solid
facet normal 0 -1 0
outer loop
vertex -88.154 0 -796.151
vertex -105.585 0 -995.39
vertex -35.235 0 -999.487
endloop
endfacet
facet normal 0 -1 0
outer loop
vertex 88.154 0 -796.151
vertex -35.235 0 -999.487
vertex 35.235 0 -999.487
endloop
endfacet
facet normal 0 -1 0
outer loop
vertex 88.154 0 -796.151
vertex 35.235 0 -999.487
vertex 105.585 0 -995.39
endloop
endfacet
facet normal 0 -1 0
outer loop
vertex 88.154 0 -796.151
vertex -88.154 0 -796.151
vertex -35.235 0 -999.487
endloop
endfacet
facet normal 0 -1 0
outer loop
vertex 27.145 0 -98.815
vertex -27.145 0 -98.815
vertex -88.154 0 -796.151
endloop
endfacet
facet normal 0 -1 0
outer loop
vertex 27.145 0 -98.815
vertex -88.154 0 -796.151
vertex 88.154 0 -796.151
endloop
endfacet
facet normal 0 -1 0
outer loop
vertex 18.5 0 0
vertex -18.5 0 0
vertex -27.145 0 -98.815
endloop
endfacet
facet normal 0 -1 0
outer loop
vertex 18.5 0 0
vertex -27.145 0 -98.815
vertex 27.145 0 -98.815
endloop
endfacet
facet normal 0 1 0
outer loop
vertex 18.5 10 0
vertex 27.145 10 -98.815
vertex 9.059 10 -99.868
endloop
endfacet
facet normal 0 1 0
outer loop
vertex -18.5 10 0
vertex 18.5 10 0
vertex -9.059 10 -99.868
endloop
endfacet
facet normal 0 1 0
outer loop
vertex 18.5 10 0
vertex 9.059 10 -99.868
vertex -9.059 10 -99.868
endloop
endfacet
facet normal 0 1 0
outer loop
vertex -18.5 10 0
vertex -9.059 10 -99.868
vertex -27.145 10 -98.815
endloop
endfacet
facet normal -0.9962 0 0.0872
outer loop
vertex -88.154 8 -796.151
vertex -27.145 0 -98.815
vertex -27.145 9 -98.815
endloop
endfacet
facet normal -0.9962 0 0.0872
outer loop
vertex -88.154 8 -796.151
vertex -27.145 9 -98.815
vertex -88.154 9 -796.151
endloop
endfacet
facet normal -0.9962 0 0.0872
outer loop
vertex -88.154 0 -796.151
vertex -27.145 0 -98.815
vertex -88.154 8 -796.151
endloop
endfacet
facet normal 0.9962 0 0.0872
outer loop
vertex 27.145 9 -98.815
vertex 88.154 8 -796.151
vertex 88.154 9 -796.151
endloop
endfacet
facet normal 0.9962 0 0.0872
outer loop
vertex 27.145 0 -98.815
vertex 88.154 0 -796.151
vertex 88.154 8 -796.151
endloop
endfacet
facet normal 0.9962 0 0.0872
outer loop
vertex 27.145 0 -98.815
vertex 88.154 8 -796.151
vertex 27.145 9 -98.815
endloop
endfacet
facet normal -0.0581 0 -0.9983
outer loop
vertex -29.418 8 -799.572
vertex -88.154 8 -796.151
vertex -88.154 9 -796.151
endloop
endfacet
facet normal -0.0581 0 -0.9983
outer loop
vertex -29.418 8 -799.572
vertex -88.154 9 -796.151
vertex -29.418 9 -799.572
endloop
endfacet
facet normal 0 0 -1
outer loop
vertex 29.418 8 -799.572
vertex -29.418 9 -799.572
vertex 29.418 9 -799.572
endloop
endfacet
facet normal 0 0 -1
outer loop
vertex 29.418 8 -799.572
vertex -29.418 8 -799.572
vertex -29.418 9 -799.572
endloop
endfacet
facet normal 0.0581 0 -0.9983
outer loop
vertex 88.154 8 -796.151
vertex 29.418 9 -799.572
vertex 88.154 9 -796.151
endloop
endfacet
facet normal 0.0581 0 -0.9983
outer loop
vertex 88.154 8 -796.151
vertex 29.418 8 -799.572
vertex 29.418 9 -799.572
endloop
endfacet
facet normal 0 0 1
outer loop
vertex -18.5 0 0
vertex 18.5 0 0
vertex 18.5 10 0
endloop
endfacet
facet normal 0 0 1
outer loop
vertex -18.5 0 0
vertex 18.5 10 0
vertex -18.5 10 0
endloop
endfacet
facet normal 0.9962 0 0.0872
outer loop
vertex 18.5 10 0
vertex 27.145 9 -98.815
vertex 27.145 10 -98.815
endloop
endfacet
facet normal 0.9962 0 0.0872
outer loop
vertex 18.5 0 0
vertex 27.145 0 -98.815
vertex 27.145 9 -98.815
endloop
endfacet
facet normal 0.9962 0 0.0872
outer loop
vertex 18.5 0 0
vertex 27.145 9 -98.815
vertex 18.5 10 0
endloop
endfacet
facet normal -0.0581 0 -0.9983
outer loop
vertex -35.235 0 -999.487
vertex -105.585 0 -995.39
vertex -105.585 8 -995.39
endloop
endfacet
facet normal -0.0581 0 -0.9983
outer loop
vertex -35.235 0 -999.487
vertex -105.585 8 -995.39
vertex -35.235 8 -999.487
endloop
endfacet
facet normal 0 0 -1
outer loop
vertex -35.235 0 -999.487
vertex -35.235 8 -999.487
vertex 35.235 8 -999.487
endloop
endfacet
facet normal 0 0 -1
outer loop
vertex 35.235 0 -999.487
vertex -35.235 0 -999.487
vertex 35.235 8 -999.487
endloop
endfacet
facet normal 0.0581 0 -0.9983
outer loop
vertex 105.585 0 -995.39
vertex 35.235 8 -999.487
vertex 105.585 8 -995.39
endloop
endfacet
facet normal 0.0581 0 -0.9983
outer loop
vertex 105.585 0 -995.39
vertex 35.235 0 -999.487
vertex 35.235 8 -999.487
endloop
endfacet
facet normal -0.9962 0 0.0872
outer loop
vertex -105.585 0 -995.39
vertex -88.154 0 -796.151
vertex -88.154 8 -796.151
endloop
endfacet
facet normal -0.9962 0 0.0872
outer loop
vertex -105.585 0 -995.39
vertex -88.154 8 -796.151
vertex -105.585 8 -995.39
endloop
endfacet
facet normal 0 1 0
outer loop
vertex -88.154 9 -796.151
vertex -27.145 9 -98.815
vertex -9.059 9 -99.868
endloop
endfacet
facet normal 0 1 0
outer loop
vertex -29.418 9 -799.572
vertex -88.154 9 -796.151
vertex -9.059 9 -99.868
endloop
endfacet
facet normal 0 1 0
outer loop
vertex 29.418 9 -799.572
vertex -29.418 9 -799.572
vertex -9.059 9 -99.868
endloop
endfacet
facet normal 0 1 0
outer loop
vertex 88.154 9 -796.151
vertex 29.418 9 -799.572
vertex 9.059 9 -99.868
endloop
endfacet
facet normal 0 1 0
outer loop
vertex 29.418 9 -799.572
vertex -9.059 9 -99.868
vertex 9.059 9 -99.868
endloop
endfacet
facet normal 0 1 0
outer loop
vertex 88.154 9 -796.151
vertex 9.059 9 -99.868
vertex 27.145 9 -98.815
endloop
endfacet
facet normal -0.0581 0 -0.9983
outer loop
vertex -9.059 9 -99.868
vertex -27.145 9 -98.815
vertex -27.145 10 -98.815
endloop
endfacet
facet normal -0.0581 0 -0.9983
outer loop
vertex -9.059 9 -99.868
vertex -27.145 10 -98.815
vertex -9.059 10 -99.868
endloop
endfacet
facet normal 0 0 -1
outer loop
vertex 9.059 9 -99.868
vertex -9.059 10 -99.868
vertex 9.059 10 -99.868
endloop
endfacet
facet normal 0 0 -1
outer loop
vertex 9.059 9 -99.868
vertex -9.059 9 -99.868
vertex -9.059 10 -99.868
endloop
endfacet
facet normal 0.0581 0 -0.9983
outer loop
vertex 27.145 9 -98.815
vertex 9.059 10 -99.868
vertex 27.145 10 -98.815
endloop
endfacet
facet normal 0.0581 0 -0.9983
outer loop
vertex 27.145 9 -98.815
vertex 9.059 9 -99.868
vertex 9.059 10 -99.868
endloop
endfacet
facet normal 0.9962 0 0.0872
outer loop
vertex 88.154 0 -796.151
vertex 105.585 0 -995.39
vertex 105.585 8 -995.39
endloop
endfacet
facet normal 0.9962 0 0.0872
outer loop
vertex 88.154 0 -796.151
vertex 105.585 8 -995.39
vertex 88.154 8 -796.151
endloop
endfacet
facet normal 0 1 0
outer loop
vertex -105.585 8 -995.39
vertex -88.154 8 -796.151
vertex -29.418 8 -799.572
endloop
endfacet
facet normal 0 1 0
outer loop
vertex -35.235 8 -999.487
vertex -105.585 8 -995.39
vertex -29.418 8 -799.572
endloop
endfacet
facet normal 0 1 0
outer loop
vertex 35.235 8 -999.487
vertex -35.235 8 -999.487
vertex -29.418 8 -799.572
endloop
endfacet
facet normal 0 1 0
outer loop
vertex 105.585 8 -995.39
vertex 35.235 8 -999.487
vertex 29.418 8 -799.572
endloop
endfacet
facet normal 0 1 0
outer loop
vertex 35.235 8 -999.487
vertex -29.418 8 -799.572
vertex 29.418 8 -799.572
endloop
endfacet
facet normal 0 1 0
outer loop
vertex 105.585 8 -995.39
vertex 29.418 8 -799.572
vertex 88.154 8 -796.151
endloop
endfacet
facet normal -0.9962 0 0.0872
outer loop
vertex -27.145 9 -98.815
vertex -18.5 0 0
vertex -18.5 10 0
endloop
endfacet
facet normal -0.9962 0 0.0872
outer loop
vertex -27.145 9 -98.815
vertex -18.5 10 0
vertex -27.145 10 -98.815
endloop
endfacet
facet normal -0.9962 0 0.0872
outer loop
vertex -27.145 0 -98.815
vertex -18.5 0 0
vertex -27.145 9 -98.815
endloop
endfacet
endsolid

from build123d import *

# Parameters (mm, degrees)
EXTRUSION1_DEPTH = 10
EXTRUSION2_DEPTH = 9
EXTRUSION3_DEPTH = 8


with BuildPart() as part:
    # Esquisse1 → Extrusion1 (new body)
    with BuildSketch(Plane(origin=(0, 0, 0), x_dir=(1, 0, 0), z_dir=(0, 1, 0))):
        with BuildLine():
            Line((18.5, 0), (-18.5, 0))
            Line((-18.5, 0), (-27.145176189, 98.814816012))
            ThreePointArc((-27.145176189, 98.814816012), (0, 100), (27.145176189, 98.814816012))
            Line((27.145176189, 98.814816012), (18.5, 0))
        make_face()
    extrude(amount=EXTRUSION1_DEPTH)

    # Esquisse2 → Extrusion2 (add)
    with BuildSketch(Plane.XZ):
        with BuildLine():
            Line((-27.145176189, -98.814816012), (-88.154196113, -796.151104676))
            ThreePointArc((-88.154196113, -796.151104676), (0, -800), (88.154196113, -796.151104676))
            Line((88.154196113, -796.151104676), (27.145176189, -98.814816012))
            ThreePointArc((27.145176189, -98.814816012), (0, -100), (-27.145176189, -98.814816012))
        make_face()
    extrude(amount=-EXTRUSION2_DEPTH)

    # Esquisse5 → Extrusion3 (add)
    with BuildSketch(Plane.XZ):
        with BuildLine():
            Line((-88.154196113, -796.151104676), (-105.585344662, -995.390044295))
            ThreePointArc((-105.585344662, -995.390044295), (0, -1000), (105.585344662, -995.390044295))
            Line((105.585344662, -995.390044295), (88.154196113, -796.151104676))
            ThreePointArc((88.154196113, -796.151104676), (0, -800), (-88.154196113, -796.151104676))
        make_face()
    extrude(amount=-EXTRUSION3_DEPTH)


solid = part.part
